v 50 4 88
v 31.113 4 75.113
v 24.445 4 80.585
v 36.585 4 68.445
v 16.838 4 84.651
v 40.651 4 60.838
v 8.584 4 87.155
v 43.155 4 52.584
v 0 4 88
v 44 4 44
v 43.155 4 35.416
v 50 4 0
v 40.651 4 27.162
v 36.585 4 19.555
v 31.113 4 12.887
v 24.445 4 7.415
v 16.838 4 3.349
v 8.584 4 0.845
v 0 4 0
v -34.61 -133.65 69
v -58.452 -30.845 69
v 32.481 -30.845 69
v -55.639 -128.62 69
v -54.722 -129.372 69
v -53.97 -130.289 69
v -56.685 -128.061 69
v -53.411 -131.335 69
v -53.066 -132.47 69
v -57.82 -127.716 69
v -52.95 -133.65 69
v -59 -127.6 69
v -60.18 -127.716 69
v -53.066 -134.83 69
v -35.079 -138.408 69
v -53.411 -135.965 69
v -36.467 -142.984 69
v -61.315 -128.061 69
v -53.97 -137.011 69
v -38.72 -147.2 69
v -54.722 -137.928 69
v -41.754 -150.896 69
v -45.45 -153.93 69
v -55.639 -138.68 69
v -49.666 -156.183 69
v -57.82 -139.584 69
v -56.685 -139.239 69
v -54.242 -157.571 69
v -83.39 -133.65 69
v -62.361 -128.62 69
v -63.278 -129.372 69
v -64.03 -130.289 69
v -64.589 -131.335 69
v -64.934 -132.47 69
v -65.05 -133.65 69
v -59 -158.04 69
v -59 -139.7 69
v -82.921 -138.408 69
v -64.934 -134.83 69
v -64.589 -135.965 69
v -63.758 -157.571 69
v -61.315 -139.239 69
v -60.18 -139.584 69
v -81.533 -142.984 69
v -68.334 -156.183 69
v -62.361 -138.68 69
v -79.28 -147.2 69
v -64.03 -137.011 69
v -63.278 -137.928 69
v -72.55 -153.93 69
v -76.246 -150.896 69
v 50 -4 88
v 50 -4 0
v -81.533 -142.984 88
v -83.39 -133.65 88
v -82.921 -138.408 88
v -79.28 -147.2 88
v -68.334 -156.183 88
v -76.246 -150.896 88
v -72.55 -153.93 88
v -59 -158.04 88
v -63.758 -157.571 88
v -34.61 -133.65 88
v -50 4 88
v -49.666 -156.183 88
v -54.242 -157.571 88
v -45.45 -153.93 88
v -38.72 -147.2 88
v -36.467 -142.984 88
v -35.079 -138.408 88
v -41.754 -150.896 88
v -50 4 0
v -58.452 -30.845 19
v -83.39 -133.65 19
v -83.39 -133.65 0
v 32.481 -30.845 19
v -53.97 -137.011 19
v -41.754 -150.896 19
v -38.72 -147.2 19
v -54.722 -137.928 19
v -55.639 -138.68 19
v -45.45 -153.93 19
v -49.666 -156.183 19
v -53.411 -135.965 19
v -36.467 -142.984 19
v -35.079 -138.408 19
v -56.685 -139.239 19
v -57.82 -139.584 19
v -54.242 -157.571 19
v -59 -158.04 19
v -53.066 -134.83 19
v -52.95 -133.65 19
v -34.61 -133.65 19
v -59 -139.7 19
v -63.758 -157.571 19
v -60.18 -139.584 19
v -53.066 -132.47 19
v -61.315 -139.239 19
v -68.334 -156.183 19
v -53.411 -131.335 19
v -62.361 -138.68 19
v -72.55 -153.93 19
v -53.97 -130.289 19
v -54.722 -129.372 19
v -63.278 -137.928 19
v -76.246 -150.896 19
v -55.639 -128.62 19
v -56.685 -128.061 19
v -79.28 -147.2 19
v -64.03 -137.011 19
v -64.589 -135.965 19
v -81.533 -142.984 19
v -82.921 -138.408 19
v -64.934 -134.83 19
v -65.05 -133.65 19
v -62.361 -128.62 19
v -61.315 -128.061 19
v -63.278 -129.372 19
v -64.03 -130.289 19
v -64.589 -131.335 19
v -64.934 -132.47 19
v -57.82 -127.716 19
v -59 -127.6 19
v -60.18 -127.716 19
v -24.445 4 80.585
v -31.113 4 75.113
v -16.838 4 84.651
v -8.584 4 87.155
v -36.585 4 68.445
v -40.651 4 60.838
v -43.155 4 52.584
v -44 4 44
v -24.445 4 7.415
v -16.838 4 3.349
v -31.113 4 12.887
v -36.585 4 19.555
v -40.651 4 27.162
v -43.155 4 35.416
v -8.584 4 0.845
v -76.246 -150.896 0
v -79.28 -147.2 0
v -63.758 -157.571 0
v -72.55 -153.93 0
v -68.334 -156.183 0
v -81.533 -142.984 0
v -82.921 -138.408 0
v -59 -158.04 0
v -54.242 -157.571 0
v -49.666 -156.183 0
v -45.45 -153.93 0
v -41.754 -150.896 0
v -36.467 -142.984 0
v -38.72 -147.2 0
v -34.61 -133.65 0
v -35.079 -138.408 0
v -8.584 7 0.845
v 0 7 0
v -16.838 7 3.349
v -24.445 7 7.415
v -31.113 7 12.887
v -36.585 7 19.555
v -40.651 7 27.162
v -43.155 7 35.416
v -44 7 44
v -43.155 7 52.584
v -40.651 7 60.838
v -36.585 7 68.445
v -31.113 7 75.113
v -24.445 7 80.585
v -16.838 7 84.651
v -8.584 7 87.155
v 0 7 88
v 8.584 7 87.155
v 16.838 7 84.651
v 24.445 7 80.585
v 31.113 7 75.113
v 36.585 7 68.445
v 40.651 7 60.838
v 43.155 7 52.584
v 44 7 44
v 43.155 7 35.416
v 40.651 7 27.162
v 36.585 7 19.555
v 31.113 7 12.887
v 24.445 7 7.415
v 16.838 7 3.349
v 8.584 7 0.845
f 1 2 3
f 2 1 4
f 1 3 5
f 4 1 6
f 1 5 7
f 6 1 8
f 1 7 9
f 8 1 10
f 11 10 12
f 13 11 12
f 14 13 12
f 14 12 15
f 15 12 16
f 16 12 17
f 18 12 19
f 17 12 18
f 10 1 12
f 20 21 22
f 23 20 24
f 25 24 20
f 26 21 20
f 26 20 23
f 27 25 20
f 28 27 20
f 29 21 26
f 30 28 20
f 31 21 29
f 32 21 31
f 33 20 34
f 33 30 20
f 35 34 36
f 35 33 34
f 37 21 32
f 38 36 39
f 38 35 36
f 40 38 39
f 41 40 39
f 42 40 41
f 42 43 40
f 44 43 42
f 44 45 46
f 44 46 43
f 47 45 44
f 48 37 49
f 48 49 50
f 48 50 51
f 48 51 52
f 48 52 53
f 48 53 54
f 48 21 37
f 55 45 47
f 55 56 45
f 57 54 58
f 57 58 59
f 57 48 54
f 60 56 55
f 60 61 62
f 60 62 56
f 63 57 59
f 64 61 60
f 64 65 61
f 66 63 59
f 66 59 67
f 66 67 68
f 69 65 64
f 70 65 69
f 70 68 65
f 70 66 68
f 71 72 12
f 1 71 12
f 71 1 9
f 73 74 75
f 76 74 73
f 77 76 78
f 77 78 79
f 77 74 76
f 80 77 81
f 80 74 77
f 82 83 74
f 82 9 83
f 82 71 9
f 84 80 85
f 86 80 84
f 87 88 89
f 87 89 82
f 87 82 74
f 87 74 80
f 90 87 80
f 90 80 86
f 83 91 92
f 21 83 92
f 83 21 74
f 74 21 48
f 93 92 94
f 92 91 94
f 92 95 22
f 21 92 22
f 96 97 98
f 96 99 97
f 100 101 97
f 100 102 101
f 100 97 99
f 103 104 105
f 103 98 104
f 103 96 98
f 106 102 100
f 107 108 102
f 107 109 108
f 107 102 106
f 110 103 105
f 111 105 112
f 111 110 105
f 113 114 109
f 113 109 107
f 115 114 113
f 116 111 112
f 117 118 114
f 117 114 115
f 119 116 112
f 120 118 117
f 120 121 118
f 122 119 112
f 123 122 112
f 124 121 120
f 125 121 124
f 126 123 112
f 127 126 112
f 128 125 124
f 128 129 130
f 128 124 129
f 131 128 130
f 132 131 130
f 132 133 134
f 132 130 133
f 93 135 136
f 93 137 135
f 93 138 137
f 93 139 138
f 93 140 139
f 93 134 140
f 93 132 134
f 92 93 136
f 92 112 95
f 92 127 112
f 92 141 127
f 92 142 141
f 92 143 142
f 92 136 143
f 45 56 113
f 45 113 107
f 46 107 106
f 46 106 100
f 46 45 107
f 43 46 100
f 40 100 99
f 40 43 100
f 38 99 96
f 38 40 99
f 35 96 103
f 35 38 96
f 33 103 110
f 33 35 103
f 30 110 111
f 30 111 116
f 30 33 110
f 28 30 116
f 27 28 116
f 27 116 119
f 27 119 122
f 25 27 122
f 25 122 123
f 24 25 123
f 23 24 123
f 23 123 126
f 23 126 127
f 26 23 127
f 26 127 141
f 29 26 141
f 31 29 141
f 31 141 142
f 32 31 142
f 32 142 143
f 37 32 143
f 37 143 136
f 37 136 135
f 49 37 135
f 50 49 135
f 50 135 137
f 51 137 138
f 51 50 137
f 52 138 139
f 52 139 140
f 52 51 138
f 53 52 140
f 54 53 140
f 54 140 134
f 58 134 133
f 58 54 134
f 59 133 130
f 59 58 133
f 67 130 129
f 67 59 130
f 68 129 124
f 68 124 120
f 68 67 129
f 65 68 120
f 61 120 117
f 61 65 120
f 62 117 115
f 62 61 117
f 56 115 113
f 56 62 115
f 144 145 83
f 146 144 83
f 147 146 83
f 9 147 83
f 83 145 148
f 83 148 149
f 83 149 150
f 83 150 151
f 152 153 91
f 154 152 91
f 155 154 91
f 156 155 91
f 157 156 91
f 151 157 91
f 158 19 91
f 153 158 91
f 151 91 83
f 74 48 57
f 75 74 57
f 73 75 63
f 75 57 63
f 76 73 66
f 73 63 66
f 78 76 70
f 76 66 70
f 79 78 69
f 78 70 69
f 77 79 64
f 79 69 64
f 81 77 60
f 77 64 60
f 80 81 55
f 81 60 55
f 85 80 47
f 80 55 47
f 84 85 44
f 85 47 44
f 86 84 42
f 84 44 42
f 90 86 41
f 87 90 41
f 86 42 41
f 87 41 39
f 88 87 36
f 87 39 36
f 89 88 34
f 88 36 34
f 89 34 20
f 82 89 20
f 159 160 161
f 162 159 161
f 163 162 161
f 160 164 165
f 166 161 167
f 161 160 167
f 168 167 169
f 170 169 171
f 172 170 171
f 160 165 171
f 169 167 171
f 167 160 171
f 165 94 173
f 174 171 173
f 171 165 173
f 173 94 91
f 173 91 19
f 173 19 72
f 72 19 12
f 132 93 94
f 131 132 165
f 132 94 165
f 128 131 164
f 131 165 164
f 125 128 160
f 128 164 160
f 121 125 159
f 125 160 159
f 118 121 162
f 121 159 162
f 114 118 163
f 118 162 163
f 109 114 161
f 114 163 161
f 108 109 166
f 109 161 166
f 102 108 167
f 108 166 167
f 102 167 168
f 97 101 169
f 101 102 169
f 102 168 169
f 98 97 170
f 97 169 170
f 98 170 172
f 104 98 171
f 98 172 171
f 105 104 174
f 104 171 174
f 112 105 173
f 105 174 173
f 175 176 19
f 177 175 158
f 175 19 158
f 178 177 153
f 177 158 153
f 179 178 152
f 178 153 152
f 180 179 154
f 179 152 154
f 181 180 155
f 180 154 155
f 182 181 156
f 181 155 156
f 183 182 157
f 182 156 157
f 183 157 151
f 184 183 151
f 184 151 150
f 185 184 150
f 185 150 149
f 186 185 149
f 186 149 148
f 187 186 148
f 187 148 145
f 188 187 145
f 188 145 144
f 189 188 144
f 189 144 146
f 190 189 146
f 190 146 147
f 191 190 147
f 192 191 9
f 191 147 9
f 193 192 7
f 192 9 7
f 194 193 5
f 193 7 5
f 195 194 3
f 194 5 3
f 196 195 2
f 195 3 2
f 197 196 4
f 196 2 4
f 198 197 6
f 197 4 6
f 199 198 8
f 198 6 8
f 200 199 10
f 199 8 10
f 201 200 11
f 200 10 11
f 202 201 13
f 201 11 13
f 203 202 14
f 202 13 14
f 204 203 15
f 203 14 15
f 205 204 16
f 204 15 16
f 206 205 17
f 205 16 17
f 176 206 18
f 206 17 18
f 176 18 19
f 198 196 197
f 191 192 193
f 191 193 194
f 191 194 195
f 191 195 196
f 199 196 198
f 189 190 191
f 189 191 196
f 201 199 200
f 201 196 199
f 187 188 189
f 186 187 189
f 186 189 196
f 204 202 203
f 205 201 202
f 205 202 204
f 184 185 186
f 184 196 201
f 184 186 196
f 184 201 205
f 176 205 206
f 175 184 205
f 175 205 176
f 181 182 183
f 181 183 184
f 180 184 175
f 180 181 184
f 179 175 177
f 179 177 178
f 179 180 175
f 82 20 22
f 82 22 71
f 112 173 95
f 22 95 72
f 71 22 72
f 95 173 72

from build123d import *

# Parameters (mm, degrees)
ESTRUSIONE_ESTRUSIONE1_DEPTH  = 88
TAGLIO_ESTRUSIONE2_DEPTH      = 200.184672352
TAGLIO_ESTRUSIONE2_DEPTH_BACK = 200.184672352
SCHIZZO4_R                    = 6.05
ESTRUSIONE_ESTRUSIONE2_DEPTH  = 69
SCHIZZO6_R                    = 44
ESTRUSIONE_ESTRUSIONE3_DEPTH  = 3


with BuildPart() as part:
    # Schizzo1 → Estrusione-Estrusione1 (new body)
    with BuildSketch(Plane.XY):
        with BuildLine():
            Line((-50, 4), (-83.39, -133.65))
            ThreePointArc((-83.39, -133.65), (-59, -158.04), (-34.61, -133.65))
            Line((-34.61, -133.65), (50, -4))
            Line((50, -4), (50, 4))
            Line((50, 4), (-50, 4))
        make_face()
    extrude(amount=ESTRUSIONE_ESTRUSIONE1_DEPTH)

    # Schizzo2 → Taglio-Estrusione2 (cut, two sides: drawn at the far end of the back side and taken through both)
    with BuildSketch(Plane(origin=(0, 0, 0), x_dir=(0, 0, -1), z_dir=(1, 0, 0)).offset(-TAGLIO_ESTRUSIONE2_DEPTH_BACK)):
        Polygon((-69, -45.845), (-69, -245.845), (-19, -245.845), (-19, -45.845), (-19, -30.845), (-69, -30.845), align=None)
    extrude(amount=TAGLIO_ESTRUSIONE2_DEPTH + TAGLIO_ESTRUSIONE2_DEPTH_BACK, mode=Mode.SUBTRACT)

    # Schizzo4 → Estrusione-Estrusione2 (add)
    with BuildSketch(Plane.XY.offset(88)):
        with Locations(Location((-59, -133.65, 0), (0, 0, 270))):
            Circle(SCHIZZO4_R)
    extrude(amount=-ESTRUSIONE_ESTRUSIONE2_DEPTH)

    # Schizzo6 → Estrusione-Estrusione3 (add)
    with BuildSketch(Plane(origin=(0, 4, 0), x_dir=(1, 0, 0), z_dir=(0, 1, 0))):
        with Locations(Location((0, -44, 0), (0, 0, 90))):
            Circle(SCHIZZO6_R)
    extrude(amount=ESTRUSIONE_ESTRUSIONE3_DEPTH)


solid = part.part
